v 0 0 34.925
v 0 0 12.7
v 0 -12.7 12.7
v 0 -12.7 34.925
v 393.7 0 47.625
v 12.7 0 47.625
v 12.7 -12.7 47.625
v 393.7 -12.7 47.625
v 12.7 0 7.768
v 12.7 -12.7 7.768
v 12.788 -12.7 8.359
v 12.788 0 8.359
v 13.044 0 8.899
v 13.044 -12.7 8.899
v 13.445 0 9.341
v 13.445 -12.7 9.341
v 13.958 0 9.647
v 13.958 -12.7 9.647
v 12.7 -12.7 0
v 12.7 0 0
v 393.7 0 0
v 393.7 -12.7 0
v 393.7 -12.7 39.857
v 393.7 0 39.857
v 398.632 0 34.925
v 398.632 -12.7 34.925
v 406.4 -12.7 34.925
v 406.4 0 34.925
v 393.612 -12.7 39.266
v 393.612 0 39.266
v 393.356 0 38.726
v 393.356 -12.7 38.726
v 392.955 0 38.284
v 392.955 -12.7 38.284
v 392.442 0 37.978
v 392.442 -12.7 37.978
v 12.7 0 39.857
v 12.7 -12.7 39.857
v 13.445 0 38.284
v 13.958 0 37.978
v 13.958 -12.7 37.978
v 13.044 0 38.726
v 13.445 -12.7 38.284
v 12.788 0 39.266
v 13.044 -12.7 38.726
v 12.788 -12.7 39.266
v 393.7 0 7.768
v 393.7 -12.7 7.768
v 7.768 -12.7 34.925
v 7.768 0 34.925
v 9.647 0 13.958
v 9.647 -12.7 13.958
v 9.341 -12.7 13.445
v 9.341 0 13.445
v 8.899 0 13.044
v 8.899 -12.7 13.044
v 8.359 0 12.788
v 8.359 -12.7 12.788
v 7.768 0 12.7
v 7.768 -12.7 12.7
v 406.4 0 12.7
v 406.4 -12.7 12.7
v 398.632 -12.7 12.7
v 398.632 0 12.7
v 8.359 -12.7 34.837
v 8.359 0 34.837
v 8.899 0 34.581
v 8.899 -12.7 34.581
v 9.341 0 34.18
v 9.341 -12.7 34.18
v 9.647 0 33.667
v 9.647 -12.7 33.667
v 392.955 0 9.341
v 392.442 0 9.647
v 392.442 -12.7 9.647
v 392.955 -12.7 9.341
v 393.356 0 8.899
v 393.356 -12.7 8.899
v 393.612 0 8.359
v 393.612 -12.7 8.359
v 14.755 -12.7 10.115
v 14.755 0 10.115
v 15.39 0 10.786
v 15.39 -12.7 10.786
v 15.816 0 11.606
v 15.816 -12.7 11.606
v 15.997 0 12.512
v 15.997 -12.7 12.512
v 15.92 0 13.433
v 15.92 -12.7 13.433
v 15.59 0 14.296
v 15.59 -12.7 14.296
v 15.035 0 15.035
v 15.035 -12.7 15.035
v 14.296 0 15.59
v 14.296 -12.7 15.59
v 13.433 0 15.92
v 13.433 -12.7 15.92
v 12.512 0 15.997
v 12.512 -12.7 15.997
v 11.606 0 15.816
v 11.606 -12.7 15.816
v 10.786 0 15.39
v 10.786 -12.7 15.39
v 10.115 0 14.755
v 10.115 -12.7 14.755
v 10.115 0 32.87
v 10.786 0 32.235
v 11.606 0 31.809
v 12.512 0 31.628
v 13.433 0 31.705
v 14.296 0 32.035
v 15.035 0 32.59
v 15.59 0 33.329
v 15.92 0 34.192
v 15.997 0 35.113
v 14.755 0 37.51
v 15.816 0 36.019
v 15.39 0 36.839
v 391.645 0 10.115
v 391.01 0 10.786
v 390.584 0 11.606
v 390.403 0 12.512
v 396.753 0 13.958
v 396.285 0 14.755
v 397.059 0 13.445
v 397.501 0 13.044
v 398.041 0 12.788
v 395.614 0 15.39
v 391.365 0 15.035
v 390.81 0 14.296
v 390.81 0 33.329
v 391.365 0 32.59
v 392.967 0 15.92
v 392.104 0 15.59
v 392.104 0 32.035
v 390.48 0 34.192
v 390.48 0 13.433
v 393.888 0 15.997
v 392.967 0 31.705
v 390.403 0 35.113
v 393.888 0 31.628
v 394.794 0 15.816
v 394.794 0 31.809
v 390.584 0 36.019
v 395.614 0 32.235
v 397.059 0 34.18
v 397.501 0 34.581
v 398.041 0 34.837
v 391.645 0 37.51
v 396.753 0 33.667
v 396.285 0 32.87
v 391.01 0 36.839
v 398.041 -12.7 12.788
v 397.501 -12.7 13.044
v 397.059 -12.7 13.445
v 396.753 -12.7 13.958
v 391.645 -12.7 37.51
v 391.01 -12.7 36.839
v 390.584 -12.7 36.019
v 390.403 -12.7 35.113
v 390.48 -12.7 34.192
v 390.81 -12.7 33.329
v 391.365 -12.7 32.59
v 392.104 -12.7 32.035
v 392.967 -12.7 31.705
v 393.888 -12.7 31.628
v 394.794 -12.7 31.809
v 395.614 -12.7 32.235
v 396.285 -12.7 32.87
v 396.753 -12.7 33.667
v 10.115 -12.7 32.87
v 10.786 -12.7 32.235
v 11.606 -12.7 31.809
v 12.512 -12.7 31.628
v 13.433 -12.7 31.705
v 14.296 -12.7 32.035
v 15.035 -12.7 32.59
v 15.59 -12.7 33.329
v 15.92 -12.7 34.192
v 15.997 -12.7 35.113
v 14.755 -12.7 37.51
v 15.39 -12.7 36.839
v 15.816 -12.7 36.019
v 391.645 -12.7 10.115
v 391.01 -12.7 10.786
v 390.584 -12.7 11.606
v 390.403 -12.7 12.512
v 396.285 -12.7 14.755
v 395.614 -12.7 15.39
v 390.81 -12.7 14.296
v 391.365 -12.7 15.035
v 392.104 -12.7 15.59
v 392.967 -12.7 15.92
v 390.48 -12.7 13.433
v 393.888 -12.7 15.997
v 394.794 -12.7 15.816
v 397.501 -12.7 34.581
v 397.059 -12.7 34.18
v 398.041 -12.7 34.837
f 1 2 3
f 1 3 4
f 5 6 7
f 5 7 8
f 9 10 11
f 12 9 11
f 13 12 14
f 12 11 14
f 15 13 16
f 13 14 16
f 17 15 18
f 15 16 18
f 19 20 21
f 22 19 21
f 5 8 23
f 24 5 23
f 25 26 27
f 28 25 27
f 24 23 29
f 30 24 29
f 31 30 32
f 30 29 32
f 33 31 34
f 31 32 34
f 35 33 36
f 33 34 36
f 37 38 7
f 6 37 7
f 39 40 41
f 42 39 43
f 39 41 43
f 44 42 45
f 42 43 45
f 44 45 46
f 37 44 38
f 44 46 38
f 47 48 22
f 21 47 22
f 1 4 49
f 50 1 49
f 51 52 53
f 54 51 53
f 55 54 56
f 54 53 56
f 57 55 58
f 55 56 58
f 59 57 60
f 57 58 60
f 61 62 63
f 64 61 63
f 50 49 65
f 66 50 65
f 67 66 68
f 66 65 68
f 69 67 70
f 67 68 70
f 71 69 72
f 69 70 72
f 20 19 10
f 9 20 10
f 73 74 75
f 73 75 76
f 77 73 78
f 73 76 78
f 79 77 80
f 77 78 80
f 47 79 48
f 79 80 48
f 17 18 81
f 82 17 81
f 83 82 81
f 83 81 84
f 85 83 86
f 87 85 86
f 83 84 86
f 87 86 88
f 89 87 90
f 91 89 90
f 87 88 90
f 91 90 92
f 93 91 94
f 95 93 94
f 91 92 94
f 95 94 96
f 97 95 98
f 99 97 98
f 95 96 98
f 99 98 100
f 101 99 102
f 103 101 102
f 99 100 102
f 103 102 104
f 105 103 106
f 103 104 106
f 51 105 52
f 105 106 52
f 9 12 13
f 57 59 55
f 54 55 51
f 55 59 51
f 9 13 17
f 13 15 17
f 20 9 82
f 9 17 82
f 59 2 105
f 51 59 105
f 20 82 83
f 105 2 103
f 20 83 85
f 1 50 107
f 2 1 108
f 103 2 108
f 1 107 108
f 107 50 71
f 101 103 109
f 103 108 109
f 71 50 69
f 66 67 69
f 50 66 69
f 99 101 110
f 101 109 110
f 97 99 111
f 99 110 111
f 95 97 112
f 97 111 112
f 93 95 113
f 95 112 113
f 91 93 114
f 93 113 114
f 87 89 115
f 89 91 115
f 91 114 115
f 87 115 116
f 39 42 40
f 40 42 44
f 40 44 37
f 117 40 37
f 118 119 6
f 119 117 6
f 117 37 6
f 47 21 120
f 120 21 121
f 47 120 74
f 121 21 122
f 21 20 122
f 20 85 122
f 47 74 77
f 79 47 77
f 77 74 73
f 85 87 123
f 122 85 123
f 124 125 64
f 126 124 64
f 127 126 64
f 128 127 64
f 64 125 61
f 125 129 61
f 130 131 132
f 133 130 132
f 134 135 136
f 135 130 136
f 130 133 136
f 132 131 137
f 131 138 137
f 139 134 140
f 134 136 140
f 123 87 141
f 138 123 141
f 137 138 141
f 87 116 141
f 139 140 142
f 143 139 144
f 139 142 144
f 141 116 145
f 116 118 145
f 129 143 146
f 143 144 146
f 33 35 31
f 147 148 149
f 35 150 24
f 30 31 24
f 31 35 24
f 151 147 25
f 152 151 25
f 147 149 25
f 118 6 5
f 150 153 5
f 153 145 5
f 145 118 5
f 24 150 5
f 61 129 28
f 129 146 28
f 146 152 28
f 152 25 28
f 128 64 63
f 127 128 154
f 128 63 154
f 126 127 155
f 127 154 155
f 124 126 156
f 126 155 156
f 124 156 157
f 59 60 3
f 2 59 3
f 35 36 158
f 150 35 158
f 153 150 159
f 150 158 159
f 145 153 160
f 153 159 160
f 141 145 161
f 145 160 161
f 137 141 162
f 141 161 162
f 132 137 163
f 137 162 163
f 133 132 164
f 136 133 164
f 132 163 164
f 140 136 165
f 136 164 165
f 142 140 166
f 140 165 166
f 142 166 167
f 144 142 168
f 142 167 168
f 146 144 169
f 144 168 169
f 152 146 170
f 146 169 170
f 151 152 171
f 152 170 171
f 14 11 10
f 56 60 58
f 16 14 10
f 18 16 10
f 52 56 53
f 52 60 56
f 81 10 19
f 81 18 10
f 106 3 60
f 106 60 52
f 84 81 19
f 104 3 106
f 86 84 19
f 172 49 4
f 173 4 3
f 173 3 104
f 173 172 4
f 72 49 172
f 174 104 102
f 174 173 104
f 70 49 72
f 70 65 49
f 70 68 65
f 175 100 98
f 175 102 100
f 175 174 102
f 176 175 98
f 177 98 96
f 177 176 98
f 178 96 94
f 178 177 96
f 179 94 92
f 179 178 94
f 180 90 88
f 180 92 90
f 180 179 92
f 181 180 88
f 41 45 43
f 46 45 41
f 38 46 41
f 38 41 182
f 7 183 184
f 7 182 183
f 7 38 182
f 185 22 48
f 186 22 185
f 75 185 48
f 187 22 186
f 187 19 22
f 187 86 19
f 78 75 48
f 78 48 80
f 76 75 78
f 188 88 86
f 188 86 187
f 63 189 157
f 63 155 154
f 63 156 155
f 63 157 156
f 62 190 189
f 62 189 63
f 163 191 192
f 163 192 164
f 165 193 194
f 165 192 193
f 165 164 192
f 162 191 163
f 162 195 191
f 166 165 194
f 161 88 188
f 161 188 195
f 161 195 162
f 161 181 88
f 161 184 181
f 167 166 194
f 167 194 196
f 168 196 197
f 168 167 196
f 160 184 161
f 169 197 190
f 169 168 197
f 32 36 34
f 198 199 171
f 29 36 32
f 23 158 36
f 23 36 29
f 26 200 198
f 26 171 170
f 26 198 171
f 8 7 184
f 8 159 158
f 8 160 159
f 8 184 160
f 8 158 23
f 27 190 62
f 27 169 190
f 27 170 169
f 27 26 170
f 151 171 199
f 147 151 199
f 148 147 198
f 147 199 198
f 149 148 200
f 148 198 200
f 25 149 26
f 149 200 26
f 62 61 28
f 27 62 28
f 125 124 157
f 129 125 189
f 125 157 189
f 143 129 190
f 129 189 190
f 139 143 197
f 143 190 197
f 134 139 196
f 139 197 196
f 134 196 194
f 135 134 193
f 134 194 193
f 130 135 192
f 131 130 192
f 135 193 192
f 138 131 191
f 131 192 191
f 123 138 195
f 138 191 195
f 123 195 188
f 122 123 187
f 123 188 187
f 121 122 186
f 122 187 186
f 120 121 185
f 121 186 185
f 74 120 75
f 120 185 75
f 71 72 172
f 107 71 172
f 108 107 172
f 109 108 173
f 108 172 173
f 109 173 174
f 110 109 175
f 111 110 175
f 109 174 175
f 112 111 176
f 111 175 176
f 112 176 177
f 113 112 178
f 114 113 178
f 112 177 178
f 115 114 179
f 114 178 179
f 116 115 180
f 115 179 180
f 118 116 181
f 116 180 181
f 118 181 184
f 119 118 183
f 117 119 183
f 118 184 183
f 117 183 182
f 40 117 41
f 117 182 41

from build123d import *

# Parameters (mm, degrees)
F0_W     = 406.4
F0_H     = 47.625
F1_DEPTH = 12.7
F3_DEPTH = 25.4


with BuildPart() as f1:
    # F0 (on Front) → F1 (new body)
    with BuildSketch(Plane.XZ):
        with Locations((203.2, 23.8125)):
            Rectangle(F0_W, F0_H)
    extrude(amount=F1_DEPTH)

    # F2 (on face) → F3 (cut)
    with BuildSketch(Plane.XZ.offset(12.7)):
        with BuildLine():
            Line((12.7, 47.625), (0, 47.625))
            Line((0, 47.625), (0, 34.925))
            Line((0, 34.925), (7.768212, 34.925))
            ThreePointArc((7.768212, 34.925), (8.898713, 34.581488), (9.646988, 33.667095))
            ThreePointArc((9.646988, 33.667095), (15.034867, 32.590133), (13.957905, 37.978012))
            ThreePointArc((13.957905, 37.978012), (13.043512, 38.726287), (12.7, 39.856788))
            Line((12.7, 39.856788), (12.7, 47.625))
        make_face()
        with BuildLine():
            Line((0, 12.7), (0, 0))
            Line((0, 0), (12.7, 0))
            Line((12.7, 0), (12.7, 7.768212))
            ThreePointArc((12.7, 7.768212), (13.043512, 8.898713), (13.957905, 9.646988))
            ThreePointArc((13.957905, 9.646988), (15.034867, 15.034867), (9.646988, 13.957905))
            ThreePointArc((9.646988, 13.957905), (8.898713, 13.043512), (7.768212, 12.7))
            Line((7.768212, 12.7), (0, 12.7))
        make_face()
        with BuildLine():
            Line((406.4, 12.7), (398.631788, 12.7))
            ThreePointArc((398.631788, 12.7), (397.501287, 13.043512), (396.753012, 13.957905))
            ThreePointArc((396.753012, 13.957905), (391.365133, 15.034867), (392.442095, 9.646988))
            ThreePointArc((392.442095, 9.646988), (393.356488, 8.898713), (393.7, 7.768212))
            Line((393.7, 7.768212), (393.7, 0))
            Line((393.7, 0), (406.4, 0))
            Line((406.4, 0), (406.4, 12.7))
        make_face()
        with BuildLine():
            ThreePointArc((392.442095, 37.978012), (391.365133, 32.590133), (396.753012, 33.667095))
            ThreePointArc((396.753012, 33.667095), (397.501287, 34.581488), (398.631788, 34.925))
            Line((398.631788, 34.925), (406.4, 34.925))
            Line((406.4, 34.925), (406.4, 47.625))
            Line((406.4, 47.625), (393.7, 47.625))
            Line((393.7, 47.625), (393.7, 39.856788))
            ThreePointArc((393.7, 39.856788), (393.356488, 38.726287), (392.442095, 37.978012))
        make_face()
    extrude(amount=-F3_DEPTH, mode=Mode.SUBTRACT)


solid = f1.part
